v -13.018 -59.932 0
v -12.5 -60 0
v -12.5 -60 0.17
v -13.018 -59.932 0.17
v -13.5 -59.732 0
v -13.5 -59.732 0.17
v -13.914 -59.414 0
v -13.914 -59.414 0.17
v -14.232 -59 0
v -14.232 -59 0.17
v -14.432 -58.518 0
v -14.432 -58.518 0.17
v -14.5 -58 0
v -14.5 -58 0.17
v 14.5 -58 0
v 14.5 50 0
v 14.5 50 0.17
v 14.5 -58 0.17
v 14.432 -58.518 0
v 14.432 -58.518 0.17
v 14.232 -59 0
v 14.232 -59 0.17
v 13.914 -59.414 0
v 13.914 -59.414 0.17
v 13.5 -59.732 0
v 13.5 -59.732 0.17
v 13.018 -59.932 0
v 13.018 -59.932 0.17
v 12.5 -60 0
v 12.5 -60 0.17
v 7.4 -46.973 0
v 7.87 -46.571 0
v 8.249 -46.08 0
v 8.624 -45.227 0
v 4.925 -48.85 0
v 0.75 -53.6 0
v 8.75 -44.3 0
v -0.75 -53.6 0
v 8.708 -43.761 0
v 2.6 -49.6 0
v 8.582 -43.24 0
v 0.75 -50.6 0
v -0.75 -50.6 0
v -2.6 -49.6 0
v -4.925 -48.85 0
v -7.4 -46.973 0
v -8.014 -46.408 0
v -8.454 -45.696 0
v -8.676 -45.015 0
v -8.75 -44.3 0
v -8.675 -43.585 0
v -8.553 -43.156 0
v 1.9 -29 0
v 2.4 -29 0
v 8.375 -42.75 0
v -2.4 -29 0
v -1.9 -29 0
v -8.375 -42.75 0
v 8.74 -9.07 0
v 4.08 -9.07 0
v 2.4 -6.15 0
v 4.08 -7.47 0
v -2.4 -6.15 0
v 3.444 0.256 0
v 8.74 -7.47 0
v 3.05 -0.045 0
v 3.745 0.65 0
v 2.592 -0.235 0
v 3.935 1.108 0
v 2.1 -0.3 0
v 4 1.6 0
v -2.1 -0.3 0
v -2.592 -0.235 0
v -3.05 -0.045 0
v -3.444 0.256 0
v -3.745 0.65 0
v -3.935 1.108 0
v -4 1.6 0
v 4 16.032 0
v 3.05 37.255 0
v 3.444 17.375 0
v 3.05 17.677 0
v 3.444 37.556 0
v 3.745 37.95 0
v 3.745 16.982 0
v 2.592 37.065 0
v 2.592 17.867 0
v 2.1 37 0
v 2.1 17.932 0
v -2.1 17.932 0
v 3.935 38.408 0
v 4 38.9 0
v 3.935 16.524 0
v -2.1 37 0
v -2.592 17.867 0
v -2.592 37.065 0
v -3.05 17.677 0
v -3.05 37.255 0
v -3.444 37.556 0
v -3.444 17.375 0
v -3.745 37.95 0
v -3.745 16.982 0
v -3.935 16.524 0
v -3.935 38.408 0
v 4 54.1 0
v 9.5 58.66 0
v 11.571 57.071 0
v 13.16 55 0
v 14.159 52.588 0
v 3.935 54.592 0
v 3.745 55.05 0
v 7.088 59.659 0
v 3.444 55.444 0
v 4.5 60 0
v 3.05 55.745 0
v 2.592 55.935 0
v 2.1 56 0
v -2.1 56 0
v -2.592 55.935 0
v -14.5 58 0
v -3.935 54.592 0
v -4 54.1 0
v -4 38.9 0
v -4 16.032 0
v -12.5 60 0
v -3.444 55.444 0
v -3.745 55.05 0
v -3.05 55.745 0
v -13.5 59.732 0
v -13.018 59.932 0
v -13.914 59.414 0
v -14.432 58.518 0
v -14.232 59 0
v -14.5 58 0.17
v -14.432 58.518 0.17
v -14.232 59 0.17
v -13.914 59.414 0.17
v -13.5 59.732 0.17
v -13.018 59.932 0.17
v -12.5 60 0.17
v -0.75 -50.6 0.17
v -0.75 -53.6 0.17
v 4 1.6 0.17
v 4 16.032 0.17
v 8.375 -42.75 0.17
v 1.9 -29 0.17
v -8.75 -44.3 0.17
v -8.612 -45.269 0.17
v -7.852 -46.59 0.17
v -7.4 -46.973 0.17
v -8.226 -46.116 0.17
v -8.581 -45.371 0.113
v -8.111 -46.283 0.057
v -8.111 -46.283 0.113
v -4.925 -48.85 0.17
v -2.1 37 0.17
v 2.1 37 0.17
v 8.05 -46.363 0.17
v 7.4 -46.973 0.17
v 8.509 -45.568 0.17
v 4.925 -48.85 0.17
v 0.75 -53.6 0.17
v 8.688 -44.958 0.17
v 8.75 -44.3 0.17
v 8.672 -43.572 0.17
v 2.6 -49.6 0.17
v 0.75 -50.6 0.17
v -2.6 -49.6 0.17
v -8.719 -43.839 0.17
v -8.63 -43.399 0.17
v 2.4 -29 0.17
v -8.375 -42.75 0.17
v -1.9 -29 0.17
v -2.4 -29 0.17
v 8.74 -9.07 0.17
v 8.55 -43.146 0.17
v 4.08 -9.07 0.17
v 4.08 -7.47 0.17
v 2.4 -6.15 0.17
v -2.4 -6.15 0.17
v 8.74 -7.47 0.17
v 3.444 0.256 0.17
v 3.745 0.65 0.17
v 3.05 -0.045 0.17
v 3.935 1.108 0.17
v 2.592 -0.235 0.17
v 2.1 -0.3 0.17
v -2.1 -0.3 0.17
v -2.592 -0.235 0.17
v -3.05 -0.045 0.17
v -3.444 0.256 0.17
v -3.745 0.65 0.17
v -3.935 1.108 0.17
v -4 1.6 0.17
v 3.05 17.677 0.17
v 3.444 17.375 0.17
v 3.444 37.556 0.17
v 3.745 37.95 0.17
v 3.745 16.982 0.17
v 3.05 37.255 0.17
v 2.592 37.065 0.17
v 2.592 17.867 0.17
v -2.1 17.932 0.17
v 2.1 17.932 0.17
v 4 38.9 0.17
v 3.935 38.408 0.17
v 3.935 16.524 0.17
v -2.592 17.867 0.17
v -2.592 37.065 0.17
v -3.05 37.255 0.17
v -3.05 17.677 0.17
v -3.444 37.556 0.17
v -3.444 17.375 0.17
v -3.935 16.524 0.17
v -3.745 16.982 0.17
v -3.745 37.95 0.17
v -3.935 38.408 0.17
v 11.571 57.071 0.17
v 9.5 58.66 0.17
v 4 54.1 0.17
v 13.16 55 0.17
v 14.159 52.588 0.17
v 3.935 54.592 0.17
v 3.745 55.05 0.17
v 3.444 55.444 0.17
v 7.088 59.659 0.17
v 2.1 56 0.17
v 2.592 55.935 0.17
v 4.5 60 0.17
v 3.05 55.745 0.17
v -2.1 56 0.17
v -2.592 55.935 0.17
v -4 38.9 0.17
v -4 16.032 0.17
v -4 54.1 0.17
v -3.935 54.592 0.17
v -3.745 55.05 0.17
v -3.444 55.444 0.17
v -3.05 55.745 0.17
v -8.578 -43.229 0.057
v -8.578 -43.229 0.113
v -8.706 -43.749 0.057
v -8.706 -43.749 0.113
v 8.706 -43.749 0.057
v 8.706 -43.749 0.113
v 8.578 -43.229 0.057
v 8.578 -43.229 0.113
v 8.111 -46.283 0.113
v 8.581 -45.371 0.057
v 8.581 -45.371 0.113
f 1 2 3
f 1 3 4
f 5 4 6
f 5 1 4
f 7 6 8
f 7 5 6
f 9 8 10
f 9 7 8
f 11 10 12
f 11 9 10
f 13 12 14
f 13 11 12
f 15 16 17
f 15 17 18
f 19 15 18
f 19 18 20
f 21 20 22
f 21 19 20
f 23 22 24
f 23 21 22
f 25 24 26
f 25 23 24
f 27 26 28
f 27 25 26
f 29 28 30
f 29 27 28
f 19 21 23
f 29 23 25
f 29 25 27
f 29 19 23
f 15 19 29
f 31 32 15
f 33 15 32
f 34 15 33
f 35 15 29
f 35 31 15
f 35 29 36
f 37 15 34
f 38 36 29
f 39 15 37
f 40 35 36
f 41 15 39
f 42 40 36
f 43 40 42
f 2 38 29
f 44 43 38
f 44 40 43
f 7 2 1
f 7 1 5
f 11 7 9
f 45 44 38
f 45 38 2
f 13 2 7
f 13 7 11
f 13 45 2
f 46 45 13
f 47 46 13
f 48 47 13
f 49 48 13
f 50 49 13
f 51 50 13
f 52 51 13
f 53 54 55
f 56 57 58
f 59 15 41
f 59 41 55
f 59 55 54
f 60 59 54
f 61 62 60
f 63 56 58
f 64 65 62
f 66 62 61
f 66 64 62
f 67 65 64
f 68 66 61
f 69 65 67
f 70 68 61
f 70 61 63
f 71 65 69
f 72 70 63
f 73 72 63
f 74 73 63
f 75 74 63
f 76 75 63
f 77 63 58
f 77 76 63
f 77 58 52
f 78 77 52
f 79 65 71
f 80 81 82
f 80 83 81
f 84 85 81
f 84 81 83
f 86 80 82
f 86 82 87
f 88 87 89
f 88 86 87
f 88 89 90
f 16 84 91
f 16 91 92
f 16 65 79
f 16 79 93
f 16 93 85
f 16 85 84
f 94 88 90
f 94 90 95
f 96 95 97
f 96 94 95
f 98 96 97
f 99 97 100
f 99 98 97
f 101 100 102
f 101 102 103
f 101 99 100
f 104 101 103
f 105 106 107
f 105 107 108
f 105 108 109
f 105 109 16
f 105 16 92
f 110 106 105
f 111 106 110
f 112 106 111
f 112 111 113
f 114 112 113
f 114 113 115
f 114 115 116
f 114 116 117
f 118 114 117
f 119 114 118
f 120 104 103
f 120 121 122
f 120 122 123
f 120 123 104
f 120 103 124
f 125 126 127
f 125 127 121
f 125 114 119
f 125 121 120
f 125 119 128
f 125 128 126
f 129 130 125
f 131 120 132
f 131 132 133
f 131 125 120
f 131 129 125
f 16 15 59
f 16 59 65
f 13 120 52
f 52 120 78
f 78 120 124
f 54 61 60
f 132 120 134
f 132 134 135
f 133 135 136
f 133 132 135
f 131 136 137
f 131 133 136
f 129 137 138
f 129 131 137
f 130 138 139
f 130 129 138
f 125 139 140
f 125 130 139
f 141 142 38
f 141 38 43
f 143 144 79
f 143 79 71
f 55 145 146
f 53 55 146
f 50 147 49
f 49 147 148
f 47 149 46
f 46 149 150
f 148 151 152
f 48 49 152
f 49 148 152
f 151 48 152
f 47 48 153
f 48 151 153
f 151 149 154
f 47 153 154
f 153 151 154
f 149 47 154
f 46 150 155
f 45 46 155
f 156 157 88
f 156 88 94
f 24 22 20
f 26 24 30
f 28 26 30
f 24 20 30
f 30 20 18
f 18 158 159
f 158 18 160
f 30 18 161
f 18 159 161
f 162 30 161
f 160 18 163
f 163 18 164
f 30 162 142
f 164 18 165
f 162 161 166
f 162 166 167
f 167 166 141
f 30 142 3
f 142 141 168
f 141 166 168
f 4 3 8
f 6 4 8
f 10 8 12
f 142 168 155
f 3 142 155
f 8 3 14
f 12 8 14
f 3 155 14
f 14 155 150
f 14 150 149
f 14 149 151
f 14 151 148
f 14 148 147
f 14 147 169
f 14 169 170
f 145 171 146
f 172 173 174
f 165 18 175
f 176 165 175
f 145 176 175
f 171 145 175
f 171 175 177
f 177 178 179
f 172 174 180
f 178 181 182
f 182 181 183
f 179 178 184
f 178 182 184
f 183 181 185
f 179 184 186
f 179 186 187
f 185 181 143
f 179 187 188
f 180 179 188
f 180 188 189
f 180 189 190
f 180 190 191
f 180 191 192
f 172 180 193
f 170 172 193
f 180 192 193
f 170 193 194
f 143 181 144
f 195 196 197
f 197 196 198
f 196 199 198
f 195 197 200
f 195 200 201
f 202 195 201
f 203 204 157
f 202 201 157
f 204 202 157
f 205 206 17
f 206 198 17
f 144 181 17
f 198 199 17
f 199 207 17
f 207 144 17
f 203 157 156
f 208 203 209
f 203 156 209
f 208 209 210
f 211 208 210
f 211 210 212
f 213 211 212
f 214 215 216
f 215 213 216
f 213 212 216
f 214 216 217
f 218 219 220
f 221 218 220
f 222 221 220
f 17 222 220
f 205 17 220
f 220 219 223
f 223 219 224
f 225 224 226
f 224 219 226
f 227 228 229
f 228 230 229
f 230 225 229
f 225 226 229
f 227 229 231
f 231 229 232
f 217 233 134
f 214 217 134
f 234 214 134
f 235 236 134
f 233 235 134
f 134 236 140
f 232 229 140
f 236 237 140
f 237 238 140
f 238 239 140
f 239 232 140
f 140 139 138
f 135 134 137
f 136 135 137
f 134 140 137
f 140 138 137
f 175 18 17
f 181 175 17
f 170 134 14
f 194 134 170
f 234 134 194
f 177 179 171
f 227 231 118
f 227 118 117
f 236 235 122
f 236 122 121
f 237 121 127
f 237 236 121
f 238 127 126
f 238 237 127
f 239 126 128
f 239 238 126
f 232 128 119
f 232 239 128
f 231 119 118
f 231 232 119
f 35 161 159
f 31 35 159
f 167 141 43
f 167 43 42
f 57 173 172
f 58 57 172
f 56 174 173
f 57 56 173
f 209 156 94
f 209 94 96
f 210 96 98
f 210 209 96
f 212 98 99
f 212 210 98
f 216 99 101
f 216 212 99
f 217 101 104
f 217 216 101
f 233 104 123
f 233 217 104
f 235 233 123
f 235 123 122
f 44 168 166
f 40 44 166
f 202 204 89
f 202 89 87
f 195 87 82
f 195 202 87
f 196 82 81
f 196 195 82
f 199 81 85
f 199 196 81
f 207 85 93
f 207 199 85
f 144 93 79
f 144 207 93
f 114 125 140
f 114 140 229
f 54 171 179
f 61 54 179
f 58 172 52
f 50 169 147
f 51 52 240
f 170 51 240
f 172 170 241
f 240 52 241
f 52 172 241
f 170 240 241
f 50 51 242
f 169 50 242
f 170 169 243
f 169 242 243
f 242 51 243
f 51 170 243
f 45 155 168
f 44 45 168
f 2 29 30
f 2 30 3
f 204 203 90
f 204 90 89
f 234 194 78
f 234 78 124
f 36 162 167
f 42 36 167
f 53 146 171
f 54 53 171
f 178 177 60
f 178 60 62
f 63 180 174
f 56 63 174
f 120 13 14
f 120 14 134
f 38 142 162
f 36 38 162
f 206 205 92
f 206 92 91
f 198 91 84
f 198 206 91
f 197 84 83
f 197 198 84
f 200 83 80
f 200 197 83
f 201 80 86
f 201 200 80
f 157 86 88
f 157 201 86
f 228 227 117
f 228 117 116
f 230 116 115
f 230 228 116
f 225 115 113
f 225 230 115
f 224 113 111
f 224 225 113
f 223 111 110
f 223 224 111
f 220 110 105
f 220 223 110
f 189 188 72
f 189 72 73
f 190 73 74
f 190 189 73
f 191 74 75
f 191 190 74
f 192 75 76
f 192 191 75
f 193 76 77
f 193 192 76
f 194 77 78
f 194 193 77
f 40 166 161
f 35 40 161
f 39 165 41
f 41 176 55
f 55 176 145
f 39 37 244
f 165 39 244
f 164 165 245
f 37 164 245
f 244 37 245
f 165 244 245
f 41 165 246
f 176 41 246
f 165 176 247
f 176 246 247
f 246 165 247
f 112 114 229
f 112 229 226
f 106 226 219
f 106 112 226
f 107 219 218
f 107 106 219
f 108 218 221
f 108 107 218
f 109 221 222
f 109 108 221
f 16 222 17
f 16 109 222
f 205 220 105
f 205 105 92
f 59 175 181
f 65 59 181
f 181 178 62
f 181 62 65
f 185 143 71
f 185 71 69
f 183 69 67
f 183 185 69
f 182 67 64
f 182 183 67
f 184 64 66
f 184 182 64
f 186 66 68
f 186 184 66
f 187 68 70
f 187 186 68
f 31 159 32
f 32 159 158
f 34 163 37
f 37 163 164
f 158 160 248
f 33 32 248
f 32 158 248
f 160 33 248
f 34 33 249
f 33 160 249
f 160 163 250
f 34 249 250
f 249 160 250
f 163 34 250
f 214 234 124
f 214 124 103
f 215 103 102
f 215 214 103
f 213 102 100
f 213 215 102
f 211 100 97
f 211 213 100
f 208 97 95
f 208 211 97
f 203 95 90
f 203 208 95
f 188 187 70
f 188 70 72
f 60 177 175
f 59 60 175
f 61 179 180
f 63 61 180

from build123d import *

# Parameters (mm, degrees)
BOSS_EXTRUDE8_DEPTH = 0.17
SKETCH1_W           = 1.5
SKETCH1_H           = 3
SKETCH1_W_2         = 4.66
SKETCH1_H_2         = 1.6
CUT_EXTRUDE1_DEPTH  = 62.727456614


with BuildPart() as part:
    # Sketch13 → Boss-Extrude8 (new body)
    with BuildSketch(Plane.XY):
        with BuildLine():
            Line((-12.5, 60), (4.5, 60))
            ThreePointArc((4.5, 60), (11.571067812, 57.071067812), (14.5, 50))
            Line((14.5, 50), (14.5, -58))
            ThreePointArc((14.5, -58), (13.914213562, -59.414213562), (12.5, -60))
            Line((12.5, -60), (-12.5, -60))
            ThreePointArc((-12.5, -60), (-13.914213562, -59.414213562), (-14.5, -58))
            Line((-14.5, -58), (-14.5, 58))
            ThreePointArc((-14.5, 58), (-13.914213562, 59.414213562), (-12.5, 60))
        make_face()
    extrude(amount=BOSS_EXTRUDE8_DEPTH)

    # Sketch1 → Cut-Extrude1 (cut, through all)
    with BuildSketch(Plane.XY.offset(0.17)):
        with Locations((0, -52.1)):
            Rectangle(SKETCH1_W, SKETCH1_H)
        with Locations((6.41, -8.27)):
            Rectangle(SKETCH1_W_2, SKETCH1_H_2)
        with BuildLine():
            Line((-2.1, 56), (2.1, 56))
            ThreePointArc((2.1, 56), (3.443502884, 55.443502884), (4, 54.1))
            Line((4, 54.1), (4, 38.9))
            ThreePointArc((4, 38.9), (3.443502884, 37.556497116), (2.1, 37))
            Line((2.1, 37), (-2.1, 37))
            ThreePointArc((-2.1, 37), (-3.443502884, 37.556497116), (-4, 38.9))
            Line((-4, 38.9), (-4, 54.1))
            ThreePointArc((-4, 54.1), (-3.443502884, 55.443502884), (-2.1, 56))
        make_face()
        with BuildLine():
            Line((-2.1, 17.931829774), (2.1, 17.931829774))
            ThreePointArc((2.1, 17.931829774), (3.443502884, 17.375332658), (4, 16.031829774))
            Line((4, 16.031829774), (4, 1.6))
            ThreePointArc((4, 1.6), (3.443502884, 0.256497116), (2.1, -0.3))
            Line((2.1, -0.3), (-2.1, -0.3))
            ThreePointArc((-2.1, -0.3), (-3.443502884, 0.256497116), (-4, 1.6))
            Line((-4, 1.6), (-4, 16.031829774))
            ThreePointArc((-4, 16.031829774), (-3.443502884, 17.375332658), (-2.1, 17.931829774))
        make_face()
        with BuildLine():
            Line((2.4, -6.15), (-2.4, -6.15))
            Line((-2.4, -6.15), (-2.4, -29))
            Line((-2.4, -29), (-1.9, -29))
            Line((-1.9, -29), (-8.375, -42.75))
            add(Edge.make_bspline(
                [(-8.375, -42.75), (-8.614001568, -43.20601542), (-8.749703343, -43.736930638), (-8.75, -44.3)],
                knots=[2, 2, 2, 2, 3, 3, 3, 3], degree=3))
            add(Edge.make_bspline(
                [(-8.75, -44.3), (-8.75059415, -45.427724457), (-8.211440188, -46.416320927), (-7.4, -46.97314145)],
                knots=[3, 3, 3, 3, 3.998304655, 3.998304655, 3.998304655, 3.998304655], degree=3))
            Line((-7.4, -46.97314145), (-4.925, -48.85))
            Line((-4.925, -48.85), (-2.6, -49.6))
            Line((-2.6, -49.6), (2.6, -49.6))
            Line((2.6, -49.6), (4.925, -48.85))
            Line((4.925, -48.85), (7.4, -46.97314145))
            add(Edge.make_bspline(
                [(7.4, -46.97314145), (8.211440188, -46.416320927), (8.75059415, -45.427724457), (8.75, -44.3)],
                knots=[3, 3, 3, 3, 3.998304655, 3.998304655, 3.998304655, 3.998304655], degree=3))
            add(Edge.make_bspline(
                [(8.75, -44.3), (8.749703343, -43.736930638), (8.614001568, -43.20601542), (8.375, -42.75)],
                knots=[2, 2, 2, 2, 3, 3, 3, 3], degree=3))
            Line((8.375, -42.75), (1.9, -29))
            Line((1.9, -29), (2.4, -29))
            Line((2.4, -29), (2.4, -6.15))
        make_face()
    extrude(amount=-CUT_EXTRUDE1_DEPTH, mode=Mode.SUBTRACT)


solid = part.part
